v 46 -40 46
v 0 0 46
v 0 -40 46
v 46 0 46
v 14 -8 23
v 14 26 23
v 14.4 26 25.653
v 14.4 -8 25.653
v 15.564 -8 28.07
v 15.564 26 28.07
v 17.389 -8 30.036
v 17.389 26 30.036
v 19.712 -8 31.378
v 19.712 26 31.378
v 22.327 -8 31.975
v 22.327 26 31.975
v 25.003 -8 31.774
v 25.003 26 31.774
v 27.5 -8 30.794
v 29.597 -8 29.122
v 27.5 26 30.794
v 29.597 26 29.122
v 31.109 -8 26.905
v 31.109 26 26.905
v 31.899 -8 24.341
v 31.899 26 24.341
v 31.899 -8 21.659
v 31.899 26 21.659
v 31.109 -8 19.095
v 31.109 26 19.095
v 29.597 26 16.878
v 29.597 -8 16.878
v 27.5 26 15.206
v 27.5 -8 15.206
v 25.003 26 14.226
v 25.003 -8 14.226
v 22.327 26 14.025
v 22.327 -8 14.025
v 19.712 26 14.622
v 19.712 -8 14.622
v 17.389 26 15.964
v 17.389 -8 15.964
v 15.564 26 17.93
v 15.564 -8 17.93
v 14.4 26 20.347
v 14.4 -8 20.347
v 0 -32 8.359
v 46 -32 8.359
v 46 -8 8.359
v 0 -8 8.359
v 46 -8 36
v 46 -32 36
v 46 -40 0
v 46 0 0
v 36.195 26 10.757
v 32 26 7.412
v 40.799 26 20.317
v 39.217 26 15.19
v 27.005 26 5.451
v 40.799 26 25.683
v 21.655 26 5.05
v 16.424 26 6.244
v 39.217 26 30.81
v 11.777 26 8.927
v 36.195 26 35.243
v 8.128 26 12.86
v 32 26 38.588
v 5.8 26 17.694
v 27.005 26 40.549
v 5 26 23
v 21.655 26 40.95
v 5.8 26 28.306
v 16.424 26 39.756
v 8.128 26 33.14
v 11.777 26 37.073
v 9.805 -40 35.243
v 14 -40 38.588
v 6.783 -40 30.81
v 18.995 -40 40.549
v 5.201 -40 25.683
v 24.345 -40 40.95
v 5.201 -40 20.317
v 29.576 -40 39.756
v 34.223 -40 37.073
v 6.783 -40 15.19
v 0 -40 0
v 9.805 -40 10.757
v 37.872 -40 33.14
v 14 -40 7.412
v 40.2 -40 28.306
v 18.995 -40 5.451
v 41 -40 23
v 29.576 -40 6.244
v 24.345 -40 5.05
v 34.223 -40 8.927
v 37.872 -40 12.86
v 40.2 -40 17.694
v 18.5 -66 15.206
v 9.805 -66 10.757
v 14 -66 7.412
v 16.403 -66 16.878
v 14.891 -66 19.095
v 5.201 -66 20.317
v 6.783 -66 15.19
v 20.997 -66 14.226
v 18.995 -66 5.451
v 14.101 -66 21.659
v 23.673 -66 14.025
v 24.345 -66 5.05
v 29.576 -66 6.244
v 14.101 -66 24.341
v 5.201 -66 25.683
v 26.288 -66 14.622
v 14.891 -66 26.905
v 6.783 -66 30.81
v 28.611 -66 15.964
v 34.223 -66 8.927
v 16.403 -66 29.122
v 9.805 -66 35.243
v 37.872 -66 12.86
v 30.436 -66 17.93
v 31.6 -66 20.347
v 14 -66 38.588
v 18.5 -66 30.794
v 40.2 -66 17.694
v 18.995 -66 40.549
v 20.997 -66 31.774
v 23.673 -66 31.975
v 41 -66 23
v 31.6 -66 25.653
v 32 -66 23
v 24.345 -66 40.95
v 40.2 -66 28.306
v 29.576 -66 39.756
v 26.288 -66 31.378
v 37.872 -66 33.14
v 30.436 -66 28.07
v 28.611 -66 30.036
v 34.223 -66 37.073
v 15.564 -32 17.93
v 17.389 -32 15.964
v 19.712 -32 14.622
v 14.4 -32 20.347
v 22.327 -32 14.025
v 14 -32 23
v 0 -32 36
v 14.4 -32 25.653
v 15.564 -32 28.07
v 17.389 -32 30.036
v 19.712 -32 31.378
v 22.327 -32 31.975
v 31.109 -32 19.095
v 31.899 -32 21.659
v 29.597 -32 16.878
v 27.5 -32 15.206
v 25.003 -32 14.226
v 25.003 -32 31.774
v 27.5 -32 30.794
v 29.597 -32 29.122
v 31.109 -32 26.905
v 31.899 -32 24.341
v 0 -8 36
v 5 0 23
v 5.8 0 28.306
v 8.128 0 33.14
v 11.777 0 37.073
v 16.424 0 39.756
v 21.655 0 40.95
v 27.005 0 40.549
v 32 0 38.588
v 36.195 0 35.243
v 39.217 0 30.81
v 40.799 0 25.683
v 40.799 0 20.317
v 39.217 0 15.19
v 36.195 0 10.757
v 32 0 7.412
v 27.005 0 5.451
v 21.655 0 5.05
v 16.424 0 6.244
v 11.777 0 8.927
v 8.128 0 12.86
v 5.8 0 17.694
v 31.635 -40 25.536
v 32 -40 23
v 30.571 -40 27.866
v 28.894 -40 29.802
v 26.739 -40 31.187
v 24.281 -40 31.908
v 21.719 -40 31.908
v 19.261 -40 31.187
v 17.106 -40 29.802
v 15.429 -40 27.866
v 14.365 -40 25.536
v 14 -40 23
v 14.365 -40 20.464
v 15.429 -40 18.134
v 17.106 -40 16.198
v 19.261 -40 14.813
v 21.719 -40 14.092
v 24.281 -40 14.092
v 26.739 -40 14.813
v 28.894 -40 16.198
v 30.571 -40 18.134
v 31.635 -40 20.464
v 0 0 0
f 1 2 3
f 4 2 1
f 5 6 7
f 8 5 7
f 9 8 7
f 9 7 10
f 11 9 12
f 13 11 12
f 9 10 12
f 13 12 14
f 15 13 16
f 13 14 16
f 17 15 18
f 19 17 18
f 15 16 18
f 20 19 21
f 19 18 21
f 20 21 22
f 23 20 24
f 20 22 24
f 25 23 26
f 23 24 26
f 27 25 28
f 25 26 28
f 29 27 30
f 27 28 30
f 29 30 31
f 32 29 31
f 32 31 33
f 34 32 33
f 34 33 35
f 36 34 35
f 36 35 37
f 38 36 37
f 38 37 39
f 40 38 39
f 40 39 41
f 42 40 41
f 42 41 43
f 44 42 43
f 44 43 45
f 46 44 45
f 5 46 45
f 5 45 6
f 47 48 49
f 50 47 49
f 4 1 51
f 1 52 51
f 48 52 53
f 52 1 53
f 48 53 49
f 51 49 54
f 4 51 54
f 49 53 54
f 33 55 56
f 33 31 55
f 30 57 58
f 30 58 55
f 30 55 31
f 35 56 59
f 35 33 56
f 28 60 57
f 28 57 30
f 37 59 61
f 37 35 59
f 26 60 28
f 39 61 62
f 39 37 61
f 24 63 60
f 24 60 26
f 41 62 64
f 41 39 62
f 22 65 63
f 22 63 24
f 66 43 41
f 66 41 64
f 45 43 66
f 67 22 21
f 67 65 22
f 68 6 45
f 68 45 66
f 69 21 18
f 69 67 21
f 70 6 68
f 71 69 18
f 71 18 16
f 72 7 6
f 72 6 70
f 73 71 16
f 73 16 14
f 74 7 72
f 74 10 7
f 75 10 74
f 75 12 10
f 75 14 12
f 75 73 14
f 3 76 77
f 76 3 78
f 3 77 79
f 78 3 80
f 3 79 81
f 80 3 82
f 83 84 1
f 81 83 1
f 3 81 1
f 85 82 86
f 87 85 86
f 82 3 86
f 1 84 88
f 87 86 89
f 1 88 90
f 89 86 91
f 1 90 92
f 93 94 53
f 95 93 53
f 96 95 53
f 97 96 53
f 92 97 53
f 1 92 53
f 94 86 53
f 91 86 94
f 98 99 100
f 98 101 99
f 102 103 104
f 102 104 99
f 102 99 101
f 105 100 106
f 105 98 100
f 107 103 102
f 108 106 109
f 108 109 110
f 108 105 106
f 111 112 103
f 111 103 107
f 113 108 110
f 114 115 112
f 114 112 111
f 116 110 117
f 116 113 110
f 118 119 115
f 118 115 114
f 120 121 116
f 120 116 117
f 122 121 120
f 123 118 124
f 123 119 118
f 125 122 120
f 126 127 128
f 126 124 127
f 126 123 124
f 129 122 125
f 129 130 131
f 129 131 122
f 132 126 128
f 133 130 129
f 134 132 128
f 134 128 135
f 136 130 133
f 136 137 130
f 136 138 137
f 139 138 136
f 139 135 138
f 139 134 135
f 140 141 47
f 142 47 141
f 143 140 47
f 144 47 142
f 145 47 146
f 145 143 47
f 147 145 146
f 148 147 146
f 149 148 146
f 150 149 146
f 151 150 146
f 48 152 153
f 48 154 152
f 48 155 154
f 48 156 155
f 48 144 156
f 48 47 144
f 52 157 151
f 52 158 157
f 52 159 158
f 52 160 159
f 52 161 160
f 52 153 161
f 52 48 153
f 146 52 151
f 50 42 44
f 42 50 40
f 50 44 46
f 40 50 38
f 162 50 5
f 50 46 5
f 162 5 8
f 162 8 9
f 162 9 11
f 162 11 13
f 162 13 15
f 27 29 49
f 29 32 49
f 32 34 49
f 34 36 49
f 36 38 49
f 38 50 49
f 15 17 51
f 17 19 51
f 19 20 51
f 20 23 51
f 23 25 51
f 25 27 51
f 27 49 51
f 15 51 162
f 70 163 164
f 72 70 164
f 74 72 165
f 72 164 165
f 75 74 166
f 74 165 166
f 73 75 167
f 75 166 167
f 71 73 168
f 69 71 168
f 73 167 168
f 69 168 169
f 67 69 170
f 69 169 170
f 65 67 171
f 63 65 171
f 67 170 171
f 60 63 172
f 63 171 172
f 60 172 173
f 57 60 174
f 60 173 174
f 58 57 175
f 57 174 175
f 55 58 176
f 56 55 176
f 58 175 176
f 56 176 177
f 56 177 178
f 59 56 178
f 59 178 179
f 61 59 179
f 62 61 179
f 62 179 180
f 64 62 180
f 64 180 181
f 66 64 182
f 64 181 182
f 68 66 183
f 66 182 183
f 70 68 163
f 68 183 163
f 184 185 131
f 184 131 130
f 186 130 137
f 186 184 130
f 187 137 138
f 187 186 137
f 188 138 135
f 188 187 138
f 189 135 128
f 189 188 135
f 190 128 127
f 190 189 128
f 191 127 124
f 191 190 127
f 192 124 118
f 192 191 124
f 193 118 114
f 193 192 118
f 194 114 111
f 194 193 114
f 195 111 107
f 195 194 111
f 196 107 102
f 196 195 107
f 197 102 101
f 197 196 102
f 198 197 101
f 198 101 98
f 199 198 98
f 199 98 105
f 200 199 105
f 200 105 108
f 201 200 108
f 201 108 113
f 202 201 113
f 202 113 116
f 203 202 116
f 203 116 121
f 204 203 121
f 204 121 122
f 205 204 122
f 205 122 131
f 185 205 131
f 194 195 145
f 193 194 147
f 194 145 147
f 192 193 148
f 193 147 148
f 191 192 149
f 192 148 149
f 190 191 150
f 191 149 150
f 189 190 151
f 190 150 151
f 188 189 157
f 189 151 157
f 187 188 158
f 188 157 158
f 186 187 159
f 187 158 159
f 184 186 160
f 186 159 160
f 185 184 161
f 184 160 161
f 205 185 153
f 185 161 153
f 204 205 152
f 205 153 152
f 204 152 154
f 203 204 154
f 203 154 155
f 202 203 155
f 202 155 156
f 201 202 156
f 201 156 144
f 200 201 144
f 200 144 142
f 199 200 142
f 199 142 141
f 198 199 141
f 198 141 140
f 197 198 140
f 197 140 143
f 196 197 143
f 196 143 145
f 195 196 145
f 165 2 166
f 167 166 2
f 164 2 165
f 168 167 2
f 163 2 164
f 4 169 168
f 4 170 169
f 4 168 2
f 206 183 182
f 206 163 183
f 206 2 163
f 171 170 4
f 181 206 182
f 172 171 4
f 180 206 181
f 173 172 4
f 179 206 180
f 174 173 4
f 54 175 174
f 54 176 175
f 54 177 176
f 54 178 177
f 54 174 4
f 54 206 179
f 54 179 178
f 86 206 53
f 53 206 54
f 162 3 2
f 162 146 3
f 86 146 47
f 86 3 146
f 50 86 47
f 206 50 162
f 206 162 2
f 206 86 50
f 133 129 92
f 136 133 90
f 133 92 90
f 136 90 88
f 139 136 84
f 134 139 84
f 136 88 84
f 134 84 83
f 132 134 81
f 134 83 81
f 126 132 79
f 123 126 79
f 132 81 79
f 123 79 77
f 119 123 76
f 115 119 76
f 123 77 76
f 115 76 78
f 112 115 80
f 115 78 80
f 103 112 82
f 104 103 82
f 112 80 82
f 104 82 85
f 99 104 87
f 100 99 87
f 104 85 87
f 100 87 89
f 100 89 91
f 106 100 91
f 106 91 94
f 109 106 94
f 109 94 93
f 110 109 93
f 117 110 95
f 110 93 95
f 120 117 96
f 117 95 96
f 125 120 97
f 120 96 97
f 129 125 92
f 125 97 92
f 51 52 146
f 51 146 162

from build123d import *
from build123d import SkipClean  # not in build123d's __all__

# Parameters (mm, degrees)
F0_W      = 46
F0_H      = 40
F1_DEPTH  = 46
F2_W      = 24
F2_H      = 27.6410613805
F3_DEPTH  = 46
F4_R      = 9
F6_DEPTH  = 46
F5_R      = 18
F7_DEPTH  = 26
F8_R      = 9
F9_DEPTH  = 26
F10_R     = 18
F10_R_2   = 9
F11_DEPTH = 26


with BuildPart() as f1:
    # F0 (on Top) → F1 (new body)
    with BuildSketch(Plane.XY):
        with Locations((23, -20)):
            Rectangle(F0_W, F0_H)
    extrude(amount=F1_DEPTH)

    # F2 (on face) → F3 (cut)
    with BuildSketch(Plane.YZ.offset(46)):
        with Locations((-20, 22.1794693097)):
            Rectangle(F2_W, F2_H)
    extrude(amount=-F3_DEPTH, mode=Mode.SUBTRACT)

    # F4 (on face) → F6 (cut)
    with BuildSketch(Plane(origin=(0, 0, 0), x_dir=(-1, 0, 0), z_dir=(0, 1, 0))):
        with Locations((-23, 23)):
            Circle(F4_R)
    extrude(amount=-F6_DEPTH, mode=Mode.SUBTRACT)

    # F5 (on face) → F7 (join)
    with BuildSketch(Plane(origin=(0, 0, 0), x_dir=(-1, 0, 0), z_dir=(0, 1, 0))):
        with Locations((-23, 23)):
            Circle(F5_R)
    extrude(amount=F7_DEPTH)

    # F8 (on face) → F9 (cut)
    with BuildSketch(Plane(origin=(0, 26, 0), x_dir=(-1, 0, 0), z_dir=(0, 1, 0))):
        with Locations((-23, 23)):
            Circle(F8_R)
    extrude(amount=-F9_DEPTH, mode=Mode.SUBTRACT)

    # F10 (on face) → F11 (join)
    with BuildSketch(Plane.XZ.offset(40)):
        with Locations((23, 23)):
            Circle(F10_R)
        with Locations((23, 23)):
            Circle(F10_R_2, mode=Mode.SUBTRACT)
    with SkipClean():  # cleaning this boolean's faces spoils the solid; the shape is the same uncleaned
        extrude(amount=F11_DEPTH)


solid = f1.part
